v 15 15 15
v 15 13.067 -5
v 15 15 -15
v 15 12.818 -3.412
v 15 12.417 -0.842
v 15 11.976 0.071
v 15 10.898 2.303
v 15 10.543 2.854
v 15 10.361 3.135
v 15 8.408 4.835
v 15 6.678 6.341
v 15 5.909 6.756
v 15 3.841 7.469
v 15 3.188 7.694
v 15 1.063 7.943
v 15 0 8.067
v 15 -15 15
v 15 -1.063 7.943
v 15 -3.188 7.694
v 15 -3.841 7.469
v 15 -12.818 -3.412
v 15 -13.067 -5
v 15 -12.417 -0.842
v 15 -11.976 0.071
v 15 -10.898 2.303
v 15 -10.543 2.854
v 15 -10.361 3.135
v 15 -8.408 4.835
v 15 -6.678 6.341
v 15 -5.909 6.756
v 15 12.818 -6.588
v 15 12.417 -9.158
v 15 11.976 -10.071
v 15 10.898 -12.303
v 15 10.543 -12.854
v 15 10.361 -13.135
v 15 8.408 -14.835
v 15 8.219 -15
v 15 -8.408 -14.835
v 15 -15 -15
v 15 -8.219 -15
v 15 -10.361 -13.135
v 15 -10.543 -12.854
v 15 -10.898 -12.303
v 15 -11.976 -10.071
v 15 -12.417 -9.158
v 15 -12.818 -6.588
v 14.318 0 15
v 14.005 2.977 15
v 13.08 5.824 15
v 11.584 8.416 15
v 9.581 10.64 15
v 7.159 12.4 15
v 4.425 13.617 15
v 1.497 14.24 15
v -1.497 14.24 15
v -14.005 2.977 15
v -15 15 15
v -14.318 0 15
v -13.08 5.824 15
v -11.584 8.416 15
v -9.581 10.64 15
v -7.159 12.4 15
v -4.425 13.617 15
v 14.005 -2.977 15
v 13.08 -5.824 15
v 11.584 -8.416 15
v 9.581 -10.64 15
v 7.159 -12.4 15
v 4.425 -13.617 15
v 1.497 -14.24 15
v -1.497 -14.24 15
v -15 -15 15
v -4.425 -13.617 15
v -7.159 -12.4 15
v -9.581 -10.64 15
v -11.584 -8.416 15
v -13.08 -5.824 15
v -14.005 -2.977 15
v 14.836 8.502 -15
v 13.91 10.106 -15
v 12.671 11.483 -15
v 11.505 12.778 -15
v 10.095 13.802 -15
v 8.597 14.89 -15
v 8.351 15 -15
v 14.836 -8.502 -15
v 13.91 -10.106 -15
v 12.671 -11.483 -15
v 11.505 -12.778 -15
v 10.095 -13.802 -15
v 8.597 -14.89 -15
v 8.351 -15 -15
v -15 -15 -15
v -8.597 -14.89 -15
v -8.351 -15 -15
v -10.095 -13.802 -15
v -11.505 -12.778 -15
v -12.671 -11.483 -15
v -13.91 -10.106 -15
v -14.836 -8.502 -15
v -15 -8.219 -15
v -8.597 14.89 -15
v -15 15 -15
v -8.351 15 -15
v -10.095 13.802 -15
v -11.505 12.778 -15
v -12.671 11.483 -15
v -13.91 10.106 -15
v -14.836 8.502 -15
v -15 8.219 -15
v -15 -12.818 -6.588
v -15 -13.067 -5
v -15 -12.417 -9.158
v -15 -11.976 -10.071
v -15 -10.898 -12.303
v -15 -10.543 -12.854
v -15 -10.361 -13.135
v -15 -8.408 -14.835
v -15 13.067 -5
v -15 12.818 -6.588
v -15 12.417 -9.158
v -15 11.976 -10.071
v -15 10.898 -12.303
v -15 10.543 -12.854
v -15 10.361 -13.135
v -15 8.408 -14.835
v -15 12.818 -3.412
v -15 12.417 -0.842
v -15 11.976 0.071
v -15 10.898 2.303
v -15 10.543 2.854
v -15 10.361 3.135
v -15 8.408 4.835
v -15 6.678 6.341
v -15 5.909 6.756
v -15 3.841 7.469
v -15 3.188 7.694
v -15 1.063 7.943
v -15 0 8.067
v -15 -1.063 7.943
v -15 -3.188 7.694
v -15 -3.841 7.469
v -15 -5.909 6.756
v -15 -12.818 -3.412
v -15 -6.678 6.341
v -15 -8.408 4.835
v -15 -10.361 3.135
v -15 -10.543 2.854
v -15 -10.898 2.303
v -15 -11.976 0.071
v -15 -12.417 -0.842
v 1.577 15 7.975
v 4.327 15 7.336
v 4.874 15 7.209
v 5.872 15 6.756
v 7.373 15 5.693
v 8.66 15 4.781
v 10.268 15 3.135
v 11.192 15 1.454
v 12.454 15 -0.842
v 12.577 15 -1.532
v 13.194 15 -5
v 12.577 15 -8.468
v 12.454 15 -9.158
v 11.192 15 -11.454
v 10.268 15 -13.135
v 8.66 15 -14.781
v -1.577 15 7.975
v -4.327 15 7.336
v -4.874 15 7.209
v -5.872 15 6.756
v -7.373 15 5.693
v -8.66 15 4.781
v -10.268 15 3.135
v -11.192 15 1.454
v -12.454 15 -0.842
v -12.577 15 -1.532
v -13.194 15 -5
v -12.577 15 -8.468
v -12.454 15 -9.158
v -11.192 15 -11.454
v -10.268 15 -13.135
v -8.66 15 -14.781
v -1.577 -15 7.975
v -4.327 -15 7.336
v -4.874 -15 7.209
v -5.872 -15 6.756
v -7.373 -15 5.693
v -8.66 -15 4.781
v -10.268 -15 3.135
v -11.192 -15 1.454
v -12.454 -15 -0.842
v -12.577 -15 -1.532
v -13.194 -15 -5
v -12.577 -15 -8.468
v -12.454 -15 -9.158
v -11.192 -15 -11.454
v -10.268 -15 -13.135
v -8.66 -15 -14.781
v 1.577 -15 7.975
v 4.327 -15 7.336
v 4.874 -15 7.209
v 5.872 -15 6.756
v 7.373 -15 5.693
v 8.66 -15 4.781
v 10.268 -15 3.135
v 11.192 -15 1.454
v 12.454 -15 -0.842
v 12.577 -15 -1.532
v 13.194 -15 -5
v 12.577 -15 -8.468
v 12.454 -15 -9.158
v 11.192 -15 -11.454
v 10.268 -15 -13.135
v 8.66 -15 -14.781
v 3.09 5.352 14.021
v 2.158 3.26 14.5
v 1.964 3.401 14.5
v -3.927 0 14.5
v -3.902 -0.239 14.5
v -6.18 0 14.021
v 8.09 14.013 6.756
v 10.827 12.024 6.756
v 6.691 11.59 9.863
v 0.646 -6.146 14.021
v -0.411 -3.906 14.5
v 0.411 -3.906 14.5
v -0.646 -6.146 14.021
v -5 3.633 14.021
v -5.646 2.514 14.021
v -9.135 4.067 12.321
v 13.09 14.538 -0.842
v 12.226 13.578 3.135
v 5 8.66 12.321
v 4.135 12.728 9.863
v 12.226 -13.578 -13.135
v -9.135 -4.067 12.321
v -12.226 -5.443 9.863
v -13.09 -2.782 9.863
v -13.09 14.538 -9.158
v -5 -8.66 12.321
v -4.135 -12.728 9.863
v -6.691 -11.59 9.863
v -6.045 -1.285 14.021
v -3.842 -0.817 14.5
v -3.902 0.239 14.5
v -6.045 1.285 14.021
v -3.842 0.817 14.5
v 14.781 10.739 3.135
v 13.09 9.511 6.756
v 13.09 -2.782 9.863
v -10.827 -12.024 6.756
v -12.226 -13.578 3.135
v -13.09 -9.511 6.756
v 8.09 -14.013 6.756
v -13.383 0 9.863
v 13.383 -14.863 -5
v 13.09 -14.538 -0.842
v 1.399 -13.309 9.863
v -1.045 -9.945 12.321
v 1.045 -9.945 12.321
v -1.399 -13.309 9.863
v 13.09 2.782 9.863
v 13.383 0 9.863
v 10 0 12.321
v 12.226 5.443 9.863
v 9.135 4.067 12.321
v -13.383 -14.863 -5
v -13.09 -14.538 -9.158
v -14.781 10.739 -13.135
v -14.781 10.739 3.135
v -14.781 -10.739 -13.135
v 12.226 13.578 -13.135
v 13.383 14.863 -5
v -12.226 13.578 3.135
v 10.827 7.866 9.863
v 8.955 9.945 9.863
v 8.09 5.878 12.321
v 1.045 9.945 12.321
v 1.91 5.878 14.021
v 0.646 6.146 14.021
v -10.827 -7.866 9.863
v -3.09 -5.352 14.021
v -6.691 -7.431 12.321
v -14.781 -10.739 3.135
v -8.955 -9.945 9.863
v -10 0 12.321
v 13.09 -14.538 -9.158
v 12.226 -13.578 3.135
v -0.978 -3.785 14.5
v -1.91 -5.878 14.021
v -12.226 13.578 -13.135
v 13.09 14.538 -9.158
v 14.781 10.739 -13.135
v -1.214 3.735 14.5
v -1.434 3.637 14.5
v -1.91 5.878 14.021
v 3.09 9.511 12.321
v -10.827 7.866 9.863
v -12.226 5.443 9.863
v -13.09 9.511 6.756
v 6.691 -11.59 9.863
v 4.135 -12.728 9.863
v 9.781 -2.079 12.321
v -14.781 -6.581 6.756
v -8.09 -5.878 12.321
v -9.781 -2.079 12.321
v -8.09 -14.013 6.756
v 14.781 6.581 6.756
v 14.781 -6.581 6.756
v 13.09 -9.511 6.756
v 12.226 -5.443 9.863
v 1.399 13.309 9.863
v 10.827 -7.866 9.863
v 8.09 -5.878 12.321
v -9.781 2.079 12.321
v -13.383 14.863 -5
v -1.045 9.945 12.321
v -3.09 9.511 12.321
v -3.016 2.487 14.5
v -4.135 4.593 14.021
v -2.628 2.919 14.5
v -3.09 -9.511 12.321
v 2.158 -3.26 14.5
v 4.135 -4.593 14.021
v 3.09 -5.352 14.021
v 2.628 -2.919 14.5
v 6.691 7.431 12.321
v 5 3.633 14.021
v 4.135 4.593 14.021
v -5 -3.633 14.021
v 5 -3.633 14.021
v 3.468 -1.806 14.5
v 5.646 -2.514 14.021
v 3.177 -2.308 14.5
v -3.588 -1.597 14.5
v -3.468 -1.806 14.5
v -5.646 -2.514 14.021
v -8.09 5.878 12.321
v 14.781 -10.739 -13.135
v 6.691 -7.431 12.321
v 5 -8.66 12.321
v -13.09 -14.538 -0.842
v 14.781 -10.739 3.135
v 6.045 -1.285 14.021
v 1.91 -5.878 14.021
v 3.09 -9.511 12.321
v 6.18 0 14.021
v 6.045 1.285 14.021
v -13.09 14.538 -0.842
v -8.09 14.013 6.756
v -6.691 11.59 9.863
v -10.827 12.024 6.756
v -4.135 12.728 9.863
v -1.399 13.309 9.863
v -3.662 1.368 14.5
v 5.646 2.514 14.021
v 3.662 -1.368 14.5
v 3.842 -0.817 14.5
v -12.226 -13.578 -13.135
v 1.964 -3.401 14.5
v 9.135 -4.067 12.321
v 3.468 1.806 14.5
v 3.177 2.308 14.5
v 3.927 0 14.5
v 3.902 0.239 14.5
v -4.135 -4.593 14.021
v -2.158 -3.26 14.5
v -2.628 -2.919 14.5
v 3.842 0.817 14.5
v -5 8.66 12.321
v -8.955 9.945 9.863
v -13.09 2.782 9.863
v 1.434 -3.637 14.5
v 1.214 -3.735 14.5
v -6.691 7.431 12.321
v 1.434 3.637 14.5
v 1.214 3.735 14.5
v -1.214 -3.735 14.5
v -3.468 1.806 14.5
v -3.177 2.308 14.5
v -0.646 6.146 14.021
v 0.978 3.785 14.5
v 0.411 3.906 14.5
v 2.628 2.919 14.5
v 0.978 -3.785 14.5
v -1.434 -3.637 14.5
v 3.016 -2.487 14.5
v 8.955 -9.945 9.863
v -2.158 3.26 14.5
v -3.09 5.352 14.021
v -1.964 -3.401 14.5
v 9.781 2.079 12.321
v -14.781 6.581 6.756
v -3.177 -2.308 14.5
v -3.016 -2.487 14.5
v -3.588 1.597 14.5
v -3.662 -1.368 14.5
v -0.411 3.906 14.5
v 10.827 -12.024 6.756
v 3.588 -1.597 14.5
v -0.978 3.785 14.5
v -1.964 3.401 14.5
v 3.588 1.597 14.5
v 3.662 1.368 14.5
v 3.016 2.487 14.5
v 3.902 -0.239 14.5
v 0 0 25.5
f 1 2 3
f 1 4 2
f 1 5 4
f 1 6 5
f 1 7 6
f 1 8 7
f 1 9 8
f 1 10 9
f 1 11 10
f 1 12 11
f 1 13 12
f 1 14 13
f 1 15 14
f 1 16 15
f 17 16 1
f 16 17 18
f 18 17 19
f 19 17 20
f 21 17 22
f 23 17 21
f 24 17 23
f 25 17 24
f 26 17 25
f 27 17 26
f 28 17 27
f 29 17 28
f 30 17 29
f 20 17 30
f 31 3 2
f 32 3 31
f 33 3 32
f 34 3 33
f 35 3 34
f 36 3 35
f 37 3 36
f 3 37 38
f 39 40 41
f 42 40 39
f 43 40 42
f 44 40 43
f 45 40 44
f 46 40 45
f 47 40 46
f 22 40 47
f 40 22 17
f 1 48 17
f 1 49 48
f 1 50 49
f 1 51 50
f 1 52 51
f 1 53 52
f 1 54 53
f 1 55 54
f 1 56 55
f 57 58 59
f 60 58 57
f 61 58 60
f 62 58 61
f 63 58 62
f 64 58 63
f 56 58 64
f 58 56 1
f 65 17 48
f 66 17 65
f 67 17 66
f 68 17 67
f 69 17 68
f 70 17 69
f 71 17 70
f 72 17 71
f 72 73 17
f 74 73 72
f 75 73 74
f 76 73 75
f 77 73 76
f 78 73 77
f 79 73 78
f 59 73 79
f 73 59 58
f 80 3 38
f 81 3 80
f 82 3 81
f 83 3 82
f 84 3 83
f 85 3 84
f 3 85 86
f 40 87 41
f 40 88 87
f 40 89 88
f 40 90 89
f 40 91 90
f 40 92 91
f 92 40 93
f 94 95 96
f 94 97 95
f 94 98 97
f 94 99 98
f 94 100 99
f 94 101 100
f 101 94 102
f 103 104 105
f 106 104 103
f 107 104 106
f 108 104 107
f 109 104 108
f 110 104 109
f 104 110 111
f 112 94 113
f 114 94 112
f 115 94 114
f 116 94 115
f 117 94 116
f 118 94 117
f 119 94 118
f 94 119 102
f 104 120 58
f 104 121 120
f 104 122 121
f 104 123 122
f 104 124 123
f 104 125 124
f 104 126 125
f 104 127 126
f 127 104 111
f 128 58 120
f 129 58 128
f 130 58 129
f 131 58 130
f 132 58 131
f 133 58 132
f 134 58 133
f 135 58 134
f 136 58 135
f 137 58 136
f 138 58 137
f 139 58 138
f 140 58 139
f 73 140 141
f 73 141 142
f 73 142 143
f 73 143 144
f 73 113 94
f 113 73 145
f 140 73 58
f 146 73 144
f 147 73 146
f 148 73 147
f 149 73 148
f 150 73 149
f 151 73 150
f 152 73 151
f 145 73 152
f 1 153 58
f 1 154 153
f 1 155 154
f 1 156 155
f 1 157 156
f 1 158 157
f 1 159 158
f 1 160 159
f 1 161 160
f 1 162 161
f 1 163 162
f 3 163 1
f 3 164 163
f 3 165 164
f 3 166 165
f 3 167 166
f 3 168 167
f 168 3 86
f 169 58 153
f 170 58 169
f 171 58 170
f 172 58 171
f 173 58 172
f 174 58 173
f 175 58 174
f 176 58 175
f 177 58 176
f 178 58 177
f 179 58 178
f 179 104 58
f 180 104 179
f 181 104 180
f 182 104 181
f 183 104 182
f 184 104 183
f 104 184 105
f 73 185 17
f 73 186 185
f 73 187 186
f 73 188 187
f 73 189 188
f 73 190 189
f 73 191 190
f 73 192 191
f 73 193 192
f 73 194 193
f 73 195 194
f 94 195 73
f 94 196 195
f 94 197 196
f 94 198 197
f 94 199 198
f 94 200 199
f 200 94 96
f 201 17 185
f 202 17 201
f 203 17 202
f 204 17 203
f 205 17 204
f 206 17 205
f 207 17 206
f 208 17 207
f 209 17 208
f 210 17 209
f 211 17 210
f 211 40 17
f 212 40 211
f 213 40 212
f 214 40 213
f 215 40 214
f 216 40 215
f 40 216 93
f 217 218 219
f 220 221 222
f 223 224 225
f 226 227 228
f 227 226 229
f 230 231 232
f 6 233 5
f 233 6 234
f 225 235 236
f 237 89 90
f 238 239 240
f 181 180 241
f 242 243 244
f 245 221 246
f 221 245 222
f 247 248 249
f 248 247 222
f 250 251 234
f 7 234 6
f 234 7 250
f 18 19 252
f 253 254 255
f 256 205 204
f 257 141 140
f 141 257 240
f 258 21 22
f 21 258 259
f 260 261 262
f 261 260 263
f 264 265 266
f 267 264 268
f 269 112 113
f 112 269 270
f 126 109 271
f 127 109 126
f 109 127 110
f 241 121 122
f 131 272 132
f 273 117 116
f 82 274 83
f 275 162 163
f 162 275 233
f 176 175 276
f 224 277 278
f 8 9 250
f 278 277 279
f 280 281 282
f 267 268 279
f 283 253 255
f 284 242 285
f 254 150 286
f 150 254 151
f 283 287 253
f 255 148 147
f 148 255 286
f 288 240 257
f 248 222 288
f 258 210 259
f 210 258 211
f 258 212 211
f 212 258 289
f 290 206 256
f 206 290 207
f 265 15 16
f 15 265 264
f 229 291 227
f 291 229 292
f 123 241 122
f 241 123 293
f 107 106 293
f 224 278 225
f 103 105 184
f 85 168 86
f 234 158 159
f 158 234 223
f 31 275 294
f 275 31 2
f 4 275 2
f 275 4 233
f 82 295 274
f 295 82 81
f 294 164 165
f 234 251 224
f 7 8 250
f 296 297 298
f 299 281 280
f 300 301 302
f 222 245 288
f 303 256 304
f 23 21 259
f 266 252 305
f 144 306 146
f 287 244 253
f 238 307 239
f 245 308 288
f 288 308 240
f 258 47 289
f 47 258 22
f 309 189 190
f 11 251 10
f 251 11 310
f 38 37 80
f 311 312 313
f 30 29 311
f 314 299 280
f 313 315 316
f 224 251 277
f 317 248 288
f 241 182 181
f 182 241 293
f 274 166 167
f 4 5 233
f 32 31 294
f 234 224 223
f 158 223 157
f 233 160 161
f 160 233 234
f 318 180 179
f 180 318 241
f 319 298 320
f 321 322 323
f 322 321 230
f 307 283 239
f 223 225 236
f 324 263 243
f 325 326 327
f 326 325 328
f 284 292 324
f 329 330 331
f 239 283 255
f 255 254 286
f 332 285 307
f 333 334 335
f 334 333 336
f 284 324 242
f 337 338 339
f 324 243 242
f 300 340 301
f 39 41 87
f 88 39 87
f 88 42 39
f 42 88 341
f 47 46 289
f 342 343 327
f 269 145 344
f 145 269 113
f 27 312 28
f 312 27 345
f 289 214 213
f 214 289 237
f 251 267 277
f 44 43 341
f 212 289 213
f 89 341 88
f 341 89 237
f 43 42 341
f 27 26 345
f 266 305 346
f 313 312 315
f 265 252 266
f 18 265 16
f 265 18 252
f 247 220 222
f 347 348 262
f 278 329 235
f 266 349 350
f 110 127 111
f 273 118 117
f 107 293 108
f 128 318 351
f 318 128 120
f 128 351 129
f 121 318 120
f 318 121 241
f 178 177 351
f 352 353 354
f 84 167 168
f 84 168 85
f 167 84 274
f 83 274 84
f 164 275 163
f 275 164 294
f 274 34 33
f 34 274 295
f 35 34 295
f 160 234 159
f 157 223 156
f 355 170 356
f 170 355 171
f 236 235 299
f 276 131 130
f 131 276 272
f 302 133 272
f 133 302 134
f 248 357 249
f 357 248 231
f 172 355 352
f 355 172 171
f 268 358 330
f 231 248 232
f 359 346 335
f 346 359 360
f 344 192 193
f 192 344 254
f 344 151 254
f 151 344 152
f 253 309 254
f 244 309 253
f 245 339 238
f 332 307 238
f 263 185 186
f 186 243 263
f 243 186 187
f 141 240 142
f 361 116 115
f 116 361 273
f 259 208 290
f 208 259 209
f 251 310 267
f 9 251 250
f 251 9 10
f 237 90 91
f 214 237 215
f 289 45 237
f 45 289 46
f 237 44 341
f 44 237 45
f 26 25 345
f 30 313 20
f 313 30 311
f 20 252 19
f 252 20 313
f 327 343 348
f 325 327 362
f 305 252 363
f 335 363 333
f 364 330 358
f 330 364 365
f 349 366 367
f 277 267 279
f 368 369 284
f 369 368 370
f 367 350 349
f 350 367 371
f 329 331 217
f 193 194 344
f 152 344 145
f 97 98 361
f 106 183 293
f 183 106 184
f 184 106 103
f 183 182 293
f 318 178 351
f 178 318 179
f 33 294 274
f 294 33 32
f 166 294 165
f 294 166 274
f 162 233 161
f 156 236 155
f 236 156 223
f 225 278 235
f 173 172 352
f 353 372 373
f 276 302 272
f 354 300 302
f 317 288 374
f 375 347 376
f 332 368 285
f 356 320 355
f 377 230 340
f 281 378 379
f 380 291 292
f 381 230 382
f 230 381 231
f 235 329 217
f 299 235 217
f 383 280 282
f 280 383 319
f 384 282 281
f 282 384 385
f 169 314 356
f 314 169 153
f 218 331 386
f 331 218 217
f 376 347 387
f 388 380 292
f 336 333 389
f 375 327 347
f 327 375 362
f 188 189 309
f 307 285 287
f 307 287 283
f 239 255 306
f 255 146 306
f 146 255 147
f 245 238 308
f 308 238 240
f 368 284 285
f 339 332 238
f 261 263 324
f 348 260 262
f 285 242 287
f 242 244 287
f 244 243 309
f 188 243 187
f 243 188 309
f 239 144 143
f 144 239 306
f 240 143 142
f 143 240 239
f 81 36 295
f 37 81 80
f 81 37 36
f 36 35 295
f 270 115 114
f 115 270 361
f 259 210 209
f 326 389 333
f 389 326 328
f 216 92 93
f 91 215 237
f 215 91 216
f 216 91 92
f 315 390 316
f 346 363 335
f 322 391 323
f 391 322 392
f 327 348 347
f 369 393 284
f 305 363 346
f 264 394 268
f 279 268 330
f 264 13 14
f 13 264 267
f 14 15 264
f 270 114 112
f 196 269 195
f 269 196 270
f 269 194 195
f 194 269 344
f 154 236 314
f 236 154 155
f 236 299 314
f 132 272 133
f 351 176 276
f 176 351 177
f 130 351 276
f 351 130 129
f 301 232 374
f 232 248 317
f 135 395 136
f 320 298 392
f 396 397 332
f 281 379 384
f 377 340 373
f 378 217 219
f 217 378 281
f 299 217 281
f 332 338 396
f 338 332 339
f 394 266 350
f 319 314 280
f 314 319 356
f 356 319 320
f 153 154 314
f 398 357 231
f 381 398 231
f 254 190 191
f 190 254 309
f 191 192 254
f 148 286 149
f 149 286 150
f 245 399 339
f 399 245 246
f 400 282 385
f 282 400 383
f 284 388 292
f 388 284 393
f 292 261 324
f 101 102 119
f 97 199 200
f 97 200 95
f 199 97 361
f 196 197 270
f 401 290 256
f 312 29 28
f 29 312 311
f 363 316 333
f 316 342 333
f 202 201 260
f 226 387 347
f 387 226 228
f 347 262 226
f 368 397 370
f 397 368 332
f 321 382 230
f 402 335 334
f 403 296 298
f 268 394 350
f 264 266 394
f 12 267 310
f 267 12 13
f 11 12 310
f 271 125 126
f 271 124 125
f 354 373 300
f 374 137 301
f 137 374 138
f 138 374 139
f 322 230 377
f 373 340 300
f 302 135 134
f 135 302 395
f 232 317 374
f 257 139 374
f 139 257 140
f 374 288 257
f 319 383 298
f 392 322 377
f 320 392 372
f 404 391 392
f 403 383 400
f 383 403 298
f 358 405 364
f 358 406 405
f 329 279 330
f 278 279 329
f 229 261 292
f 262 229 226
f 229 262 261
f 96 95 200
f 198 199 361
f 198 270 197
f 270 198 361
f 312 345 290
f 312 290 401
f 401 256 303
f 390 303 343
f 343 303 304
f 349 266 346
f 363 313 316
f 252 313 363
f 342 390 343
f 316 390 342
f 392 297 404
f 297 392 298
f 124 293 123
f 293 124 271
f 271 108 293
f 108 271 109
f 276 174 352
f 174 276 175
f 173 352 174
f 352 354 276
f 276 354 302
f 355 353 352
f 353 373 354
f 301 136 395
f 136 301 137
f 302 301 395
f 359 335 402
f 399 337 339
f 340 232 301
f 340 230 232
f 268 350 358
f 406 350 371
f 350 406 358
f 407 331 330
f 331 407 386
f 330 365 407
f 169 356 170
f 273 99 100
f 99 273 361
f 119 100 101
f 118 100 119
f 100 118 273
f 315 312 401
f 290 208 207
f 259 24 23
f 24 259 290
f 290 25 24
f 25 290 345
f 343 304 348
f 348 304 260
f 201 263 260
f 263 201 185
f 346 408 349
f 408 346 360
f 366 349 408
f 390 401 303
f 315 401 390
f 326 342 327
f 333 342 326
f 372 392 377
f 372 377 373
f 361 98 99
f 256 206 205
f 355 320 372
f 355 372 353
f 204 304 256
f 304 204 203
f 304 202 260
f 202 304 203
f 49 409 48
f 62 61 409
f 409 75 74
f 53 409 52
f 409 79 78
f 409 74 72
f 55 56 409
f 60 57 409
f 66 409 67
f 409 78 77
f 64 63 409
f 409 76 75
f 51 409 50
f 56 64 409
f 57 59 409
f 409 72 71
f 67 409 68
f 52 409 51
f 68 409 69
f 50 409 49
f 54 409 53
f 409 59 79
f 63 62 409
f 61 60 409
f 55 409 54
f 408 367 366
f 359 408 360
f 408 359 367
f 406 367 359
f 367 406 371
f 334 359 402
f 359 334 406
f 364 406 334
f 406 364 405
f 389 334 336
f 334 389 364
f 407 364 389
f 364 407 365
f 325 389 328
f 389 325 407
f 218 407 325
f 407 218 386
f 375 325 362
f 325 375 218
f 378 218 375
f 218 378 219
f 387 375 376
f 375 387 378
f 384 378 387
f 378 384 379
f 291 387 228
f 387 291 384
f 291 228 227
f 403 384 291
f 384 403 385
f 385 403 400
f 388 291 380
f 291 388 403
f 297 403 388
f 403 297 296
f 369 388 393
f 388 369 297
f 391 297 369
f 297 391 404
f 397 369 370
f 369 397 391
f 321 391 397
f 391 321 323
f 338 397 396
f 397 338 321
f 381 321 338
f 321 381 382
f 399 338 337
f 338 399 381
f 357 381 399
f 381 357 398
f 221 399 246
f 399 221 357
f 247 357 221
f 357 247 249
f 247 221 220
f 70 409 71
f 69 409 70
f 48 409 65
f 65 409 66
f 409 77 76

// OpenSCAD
// Example from OpenSCAD, modified for this homework
module boxHat(width, offset)
{
difference()
{
cube(width/2, center = true);
# translate([0,0,-offset]) sphere(width / 3);
}
}
translate([0,0,20]) cylinder(h = 3*5-4, r1 = 15, r2 = 0, center = true);
boxHat(60,5);
